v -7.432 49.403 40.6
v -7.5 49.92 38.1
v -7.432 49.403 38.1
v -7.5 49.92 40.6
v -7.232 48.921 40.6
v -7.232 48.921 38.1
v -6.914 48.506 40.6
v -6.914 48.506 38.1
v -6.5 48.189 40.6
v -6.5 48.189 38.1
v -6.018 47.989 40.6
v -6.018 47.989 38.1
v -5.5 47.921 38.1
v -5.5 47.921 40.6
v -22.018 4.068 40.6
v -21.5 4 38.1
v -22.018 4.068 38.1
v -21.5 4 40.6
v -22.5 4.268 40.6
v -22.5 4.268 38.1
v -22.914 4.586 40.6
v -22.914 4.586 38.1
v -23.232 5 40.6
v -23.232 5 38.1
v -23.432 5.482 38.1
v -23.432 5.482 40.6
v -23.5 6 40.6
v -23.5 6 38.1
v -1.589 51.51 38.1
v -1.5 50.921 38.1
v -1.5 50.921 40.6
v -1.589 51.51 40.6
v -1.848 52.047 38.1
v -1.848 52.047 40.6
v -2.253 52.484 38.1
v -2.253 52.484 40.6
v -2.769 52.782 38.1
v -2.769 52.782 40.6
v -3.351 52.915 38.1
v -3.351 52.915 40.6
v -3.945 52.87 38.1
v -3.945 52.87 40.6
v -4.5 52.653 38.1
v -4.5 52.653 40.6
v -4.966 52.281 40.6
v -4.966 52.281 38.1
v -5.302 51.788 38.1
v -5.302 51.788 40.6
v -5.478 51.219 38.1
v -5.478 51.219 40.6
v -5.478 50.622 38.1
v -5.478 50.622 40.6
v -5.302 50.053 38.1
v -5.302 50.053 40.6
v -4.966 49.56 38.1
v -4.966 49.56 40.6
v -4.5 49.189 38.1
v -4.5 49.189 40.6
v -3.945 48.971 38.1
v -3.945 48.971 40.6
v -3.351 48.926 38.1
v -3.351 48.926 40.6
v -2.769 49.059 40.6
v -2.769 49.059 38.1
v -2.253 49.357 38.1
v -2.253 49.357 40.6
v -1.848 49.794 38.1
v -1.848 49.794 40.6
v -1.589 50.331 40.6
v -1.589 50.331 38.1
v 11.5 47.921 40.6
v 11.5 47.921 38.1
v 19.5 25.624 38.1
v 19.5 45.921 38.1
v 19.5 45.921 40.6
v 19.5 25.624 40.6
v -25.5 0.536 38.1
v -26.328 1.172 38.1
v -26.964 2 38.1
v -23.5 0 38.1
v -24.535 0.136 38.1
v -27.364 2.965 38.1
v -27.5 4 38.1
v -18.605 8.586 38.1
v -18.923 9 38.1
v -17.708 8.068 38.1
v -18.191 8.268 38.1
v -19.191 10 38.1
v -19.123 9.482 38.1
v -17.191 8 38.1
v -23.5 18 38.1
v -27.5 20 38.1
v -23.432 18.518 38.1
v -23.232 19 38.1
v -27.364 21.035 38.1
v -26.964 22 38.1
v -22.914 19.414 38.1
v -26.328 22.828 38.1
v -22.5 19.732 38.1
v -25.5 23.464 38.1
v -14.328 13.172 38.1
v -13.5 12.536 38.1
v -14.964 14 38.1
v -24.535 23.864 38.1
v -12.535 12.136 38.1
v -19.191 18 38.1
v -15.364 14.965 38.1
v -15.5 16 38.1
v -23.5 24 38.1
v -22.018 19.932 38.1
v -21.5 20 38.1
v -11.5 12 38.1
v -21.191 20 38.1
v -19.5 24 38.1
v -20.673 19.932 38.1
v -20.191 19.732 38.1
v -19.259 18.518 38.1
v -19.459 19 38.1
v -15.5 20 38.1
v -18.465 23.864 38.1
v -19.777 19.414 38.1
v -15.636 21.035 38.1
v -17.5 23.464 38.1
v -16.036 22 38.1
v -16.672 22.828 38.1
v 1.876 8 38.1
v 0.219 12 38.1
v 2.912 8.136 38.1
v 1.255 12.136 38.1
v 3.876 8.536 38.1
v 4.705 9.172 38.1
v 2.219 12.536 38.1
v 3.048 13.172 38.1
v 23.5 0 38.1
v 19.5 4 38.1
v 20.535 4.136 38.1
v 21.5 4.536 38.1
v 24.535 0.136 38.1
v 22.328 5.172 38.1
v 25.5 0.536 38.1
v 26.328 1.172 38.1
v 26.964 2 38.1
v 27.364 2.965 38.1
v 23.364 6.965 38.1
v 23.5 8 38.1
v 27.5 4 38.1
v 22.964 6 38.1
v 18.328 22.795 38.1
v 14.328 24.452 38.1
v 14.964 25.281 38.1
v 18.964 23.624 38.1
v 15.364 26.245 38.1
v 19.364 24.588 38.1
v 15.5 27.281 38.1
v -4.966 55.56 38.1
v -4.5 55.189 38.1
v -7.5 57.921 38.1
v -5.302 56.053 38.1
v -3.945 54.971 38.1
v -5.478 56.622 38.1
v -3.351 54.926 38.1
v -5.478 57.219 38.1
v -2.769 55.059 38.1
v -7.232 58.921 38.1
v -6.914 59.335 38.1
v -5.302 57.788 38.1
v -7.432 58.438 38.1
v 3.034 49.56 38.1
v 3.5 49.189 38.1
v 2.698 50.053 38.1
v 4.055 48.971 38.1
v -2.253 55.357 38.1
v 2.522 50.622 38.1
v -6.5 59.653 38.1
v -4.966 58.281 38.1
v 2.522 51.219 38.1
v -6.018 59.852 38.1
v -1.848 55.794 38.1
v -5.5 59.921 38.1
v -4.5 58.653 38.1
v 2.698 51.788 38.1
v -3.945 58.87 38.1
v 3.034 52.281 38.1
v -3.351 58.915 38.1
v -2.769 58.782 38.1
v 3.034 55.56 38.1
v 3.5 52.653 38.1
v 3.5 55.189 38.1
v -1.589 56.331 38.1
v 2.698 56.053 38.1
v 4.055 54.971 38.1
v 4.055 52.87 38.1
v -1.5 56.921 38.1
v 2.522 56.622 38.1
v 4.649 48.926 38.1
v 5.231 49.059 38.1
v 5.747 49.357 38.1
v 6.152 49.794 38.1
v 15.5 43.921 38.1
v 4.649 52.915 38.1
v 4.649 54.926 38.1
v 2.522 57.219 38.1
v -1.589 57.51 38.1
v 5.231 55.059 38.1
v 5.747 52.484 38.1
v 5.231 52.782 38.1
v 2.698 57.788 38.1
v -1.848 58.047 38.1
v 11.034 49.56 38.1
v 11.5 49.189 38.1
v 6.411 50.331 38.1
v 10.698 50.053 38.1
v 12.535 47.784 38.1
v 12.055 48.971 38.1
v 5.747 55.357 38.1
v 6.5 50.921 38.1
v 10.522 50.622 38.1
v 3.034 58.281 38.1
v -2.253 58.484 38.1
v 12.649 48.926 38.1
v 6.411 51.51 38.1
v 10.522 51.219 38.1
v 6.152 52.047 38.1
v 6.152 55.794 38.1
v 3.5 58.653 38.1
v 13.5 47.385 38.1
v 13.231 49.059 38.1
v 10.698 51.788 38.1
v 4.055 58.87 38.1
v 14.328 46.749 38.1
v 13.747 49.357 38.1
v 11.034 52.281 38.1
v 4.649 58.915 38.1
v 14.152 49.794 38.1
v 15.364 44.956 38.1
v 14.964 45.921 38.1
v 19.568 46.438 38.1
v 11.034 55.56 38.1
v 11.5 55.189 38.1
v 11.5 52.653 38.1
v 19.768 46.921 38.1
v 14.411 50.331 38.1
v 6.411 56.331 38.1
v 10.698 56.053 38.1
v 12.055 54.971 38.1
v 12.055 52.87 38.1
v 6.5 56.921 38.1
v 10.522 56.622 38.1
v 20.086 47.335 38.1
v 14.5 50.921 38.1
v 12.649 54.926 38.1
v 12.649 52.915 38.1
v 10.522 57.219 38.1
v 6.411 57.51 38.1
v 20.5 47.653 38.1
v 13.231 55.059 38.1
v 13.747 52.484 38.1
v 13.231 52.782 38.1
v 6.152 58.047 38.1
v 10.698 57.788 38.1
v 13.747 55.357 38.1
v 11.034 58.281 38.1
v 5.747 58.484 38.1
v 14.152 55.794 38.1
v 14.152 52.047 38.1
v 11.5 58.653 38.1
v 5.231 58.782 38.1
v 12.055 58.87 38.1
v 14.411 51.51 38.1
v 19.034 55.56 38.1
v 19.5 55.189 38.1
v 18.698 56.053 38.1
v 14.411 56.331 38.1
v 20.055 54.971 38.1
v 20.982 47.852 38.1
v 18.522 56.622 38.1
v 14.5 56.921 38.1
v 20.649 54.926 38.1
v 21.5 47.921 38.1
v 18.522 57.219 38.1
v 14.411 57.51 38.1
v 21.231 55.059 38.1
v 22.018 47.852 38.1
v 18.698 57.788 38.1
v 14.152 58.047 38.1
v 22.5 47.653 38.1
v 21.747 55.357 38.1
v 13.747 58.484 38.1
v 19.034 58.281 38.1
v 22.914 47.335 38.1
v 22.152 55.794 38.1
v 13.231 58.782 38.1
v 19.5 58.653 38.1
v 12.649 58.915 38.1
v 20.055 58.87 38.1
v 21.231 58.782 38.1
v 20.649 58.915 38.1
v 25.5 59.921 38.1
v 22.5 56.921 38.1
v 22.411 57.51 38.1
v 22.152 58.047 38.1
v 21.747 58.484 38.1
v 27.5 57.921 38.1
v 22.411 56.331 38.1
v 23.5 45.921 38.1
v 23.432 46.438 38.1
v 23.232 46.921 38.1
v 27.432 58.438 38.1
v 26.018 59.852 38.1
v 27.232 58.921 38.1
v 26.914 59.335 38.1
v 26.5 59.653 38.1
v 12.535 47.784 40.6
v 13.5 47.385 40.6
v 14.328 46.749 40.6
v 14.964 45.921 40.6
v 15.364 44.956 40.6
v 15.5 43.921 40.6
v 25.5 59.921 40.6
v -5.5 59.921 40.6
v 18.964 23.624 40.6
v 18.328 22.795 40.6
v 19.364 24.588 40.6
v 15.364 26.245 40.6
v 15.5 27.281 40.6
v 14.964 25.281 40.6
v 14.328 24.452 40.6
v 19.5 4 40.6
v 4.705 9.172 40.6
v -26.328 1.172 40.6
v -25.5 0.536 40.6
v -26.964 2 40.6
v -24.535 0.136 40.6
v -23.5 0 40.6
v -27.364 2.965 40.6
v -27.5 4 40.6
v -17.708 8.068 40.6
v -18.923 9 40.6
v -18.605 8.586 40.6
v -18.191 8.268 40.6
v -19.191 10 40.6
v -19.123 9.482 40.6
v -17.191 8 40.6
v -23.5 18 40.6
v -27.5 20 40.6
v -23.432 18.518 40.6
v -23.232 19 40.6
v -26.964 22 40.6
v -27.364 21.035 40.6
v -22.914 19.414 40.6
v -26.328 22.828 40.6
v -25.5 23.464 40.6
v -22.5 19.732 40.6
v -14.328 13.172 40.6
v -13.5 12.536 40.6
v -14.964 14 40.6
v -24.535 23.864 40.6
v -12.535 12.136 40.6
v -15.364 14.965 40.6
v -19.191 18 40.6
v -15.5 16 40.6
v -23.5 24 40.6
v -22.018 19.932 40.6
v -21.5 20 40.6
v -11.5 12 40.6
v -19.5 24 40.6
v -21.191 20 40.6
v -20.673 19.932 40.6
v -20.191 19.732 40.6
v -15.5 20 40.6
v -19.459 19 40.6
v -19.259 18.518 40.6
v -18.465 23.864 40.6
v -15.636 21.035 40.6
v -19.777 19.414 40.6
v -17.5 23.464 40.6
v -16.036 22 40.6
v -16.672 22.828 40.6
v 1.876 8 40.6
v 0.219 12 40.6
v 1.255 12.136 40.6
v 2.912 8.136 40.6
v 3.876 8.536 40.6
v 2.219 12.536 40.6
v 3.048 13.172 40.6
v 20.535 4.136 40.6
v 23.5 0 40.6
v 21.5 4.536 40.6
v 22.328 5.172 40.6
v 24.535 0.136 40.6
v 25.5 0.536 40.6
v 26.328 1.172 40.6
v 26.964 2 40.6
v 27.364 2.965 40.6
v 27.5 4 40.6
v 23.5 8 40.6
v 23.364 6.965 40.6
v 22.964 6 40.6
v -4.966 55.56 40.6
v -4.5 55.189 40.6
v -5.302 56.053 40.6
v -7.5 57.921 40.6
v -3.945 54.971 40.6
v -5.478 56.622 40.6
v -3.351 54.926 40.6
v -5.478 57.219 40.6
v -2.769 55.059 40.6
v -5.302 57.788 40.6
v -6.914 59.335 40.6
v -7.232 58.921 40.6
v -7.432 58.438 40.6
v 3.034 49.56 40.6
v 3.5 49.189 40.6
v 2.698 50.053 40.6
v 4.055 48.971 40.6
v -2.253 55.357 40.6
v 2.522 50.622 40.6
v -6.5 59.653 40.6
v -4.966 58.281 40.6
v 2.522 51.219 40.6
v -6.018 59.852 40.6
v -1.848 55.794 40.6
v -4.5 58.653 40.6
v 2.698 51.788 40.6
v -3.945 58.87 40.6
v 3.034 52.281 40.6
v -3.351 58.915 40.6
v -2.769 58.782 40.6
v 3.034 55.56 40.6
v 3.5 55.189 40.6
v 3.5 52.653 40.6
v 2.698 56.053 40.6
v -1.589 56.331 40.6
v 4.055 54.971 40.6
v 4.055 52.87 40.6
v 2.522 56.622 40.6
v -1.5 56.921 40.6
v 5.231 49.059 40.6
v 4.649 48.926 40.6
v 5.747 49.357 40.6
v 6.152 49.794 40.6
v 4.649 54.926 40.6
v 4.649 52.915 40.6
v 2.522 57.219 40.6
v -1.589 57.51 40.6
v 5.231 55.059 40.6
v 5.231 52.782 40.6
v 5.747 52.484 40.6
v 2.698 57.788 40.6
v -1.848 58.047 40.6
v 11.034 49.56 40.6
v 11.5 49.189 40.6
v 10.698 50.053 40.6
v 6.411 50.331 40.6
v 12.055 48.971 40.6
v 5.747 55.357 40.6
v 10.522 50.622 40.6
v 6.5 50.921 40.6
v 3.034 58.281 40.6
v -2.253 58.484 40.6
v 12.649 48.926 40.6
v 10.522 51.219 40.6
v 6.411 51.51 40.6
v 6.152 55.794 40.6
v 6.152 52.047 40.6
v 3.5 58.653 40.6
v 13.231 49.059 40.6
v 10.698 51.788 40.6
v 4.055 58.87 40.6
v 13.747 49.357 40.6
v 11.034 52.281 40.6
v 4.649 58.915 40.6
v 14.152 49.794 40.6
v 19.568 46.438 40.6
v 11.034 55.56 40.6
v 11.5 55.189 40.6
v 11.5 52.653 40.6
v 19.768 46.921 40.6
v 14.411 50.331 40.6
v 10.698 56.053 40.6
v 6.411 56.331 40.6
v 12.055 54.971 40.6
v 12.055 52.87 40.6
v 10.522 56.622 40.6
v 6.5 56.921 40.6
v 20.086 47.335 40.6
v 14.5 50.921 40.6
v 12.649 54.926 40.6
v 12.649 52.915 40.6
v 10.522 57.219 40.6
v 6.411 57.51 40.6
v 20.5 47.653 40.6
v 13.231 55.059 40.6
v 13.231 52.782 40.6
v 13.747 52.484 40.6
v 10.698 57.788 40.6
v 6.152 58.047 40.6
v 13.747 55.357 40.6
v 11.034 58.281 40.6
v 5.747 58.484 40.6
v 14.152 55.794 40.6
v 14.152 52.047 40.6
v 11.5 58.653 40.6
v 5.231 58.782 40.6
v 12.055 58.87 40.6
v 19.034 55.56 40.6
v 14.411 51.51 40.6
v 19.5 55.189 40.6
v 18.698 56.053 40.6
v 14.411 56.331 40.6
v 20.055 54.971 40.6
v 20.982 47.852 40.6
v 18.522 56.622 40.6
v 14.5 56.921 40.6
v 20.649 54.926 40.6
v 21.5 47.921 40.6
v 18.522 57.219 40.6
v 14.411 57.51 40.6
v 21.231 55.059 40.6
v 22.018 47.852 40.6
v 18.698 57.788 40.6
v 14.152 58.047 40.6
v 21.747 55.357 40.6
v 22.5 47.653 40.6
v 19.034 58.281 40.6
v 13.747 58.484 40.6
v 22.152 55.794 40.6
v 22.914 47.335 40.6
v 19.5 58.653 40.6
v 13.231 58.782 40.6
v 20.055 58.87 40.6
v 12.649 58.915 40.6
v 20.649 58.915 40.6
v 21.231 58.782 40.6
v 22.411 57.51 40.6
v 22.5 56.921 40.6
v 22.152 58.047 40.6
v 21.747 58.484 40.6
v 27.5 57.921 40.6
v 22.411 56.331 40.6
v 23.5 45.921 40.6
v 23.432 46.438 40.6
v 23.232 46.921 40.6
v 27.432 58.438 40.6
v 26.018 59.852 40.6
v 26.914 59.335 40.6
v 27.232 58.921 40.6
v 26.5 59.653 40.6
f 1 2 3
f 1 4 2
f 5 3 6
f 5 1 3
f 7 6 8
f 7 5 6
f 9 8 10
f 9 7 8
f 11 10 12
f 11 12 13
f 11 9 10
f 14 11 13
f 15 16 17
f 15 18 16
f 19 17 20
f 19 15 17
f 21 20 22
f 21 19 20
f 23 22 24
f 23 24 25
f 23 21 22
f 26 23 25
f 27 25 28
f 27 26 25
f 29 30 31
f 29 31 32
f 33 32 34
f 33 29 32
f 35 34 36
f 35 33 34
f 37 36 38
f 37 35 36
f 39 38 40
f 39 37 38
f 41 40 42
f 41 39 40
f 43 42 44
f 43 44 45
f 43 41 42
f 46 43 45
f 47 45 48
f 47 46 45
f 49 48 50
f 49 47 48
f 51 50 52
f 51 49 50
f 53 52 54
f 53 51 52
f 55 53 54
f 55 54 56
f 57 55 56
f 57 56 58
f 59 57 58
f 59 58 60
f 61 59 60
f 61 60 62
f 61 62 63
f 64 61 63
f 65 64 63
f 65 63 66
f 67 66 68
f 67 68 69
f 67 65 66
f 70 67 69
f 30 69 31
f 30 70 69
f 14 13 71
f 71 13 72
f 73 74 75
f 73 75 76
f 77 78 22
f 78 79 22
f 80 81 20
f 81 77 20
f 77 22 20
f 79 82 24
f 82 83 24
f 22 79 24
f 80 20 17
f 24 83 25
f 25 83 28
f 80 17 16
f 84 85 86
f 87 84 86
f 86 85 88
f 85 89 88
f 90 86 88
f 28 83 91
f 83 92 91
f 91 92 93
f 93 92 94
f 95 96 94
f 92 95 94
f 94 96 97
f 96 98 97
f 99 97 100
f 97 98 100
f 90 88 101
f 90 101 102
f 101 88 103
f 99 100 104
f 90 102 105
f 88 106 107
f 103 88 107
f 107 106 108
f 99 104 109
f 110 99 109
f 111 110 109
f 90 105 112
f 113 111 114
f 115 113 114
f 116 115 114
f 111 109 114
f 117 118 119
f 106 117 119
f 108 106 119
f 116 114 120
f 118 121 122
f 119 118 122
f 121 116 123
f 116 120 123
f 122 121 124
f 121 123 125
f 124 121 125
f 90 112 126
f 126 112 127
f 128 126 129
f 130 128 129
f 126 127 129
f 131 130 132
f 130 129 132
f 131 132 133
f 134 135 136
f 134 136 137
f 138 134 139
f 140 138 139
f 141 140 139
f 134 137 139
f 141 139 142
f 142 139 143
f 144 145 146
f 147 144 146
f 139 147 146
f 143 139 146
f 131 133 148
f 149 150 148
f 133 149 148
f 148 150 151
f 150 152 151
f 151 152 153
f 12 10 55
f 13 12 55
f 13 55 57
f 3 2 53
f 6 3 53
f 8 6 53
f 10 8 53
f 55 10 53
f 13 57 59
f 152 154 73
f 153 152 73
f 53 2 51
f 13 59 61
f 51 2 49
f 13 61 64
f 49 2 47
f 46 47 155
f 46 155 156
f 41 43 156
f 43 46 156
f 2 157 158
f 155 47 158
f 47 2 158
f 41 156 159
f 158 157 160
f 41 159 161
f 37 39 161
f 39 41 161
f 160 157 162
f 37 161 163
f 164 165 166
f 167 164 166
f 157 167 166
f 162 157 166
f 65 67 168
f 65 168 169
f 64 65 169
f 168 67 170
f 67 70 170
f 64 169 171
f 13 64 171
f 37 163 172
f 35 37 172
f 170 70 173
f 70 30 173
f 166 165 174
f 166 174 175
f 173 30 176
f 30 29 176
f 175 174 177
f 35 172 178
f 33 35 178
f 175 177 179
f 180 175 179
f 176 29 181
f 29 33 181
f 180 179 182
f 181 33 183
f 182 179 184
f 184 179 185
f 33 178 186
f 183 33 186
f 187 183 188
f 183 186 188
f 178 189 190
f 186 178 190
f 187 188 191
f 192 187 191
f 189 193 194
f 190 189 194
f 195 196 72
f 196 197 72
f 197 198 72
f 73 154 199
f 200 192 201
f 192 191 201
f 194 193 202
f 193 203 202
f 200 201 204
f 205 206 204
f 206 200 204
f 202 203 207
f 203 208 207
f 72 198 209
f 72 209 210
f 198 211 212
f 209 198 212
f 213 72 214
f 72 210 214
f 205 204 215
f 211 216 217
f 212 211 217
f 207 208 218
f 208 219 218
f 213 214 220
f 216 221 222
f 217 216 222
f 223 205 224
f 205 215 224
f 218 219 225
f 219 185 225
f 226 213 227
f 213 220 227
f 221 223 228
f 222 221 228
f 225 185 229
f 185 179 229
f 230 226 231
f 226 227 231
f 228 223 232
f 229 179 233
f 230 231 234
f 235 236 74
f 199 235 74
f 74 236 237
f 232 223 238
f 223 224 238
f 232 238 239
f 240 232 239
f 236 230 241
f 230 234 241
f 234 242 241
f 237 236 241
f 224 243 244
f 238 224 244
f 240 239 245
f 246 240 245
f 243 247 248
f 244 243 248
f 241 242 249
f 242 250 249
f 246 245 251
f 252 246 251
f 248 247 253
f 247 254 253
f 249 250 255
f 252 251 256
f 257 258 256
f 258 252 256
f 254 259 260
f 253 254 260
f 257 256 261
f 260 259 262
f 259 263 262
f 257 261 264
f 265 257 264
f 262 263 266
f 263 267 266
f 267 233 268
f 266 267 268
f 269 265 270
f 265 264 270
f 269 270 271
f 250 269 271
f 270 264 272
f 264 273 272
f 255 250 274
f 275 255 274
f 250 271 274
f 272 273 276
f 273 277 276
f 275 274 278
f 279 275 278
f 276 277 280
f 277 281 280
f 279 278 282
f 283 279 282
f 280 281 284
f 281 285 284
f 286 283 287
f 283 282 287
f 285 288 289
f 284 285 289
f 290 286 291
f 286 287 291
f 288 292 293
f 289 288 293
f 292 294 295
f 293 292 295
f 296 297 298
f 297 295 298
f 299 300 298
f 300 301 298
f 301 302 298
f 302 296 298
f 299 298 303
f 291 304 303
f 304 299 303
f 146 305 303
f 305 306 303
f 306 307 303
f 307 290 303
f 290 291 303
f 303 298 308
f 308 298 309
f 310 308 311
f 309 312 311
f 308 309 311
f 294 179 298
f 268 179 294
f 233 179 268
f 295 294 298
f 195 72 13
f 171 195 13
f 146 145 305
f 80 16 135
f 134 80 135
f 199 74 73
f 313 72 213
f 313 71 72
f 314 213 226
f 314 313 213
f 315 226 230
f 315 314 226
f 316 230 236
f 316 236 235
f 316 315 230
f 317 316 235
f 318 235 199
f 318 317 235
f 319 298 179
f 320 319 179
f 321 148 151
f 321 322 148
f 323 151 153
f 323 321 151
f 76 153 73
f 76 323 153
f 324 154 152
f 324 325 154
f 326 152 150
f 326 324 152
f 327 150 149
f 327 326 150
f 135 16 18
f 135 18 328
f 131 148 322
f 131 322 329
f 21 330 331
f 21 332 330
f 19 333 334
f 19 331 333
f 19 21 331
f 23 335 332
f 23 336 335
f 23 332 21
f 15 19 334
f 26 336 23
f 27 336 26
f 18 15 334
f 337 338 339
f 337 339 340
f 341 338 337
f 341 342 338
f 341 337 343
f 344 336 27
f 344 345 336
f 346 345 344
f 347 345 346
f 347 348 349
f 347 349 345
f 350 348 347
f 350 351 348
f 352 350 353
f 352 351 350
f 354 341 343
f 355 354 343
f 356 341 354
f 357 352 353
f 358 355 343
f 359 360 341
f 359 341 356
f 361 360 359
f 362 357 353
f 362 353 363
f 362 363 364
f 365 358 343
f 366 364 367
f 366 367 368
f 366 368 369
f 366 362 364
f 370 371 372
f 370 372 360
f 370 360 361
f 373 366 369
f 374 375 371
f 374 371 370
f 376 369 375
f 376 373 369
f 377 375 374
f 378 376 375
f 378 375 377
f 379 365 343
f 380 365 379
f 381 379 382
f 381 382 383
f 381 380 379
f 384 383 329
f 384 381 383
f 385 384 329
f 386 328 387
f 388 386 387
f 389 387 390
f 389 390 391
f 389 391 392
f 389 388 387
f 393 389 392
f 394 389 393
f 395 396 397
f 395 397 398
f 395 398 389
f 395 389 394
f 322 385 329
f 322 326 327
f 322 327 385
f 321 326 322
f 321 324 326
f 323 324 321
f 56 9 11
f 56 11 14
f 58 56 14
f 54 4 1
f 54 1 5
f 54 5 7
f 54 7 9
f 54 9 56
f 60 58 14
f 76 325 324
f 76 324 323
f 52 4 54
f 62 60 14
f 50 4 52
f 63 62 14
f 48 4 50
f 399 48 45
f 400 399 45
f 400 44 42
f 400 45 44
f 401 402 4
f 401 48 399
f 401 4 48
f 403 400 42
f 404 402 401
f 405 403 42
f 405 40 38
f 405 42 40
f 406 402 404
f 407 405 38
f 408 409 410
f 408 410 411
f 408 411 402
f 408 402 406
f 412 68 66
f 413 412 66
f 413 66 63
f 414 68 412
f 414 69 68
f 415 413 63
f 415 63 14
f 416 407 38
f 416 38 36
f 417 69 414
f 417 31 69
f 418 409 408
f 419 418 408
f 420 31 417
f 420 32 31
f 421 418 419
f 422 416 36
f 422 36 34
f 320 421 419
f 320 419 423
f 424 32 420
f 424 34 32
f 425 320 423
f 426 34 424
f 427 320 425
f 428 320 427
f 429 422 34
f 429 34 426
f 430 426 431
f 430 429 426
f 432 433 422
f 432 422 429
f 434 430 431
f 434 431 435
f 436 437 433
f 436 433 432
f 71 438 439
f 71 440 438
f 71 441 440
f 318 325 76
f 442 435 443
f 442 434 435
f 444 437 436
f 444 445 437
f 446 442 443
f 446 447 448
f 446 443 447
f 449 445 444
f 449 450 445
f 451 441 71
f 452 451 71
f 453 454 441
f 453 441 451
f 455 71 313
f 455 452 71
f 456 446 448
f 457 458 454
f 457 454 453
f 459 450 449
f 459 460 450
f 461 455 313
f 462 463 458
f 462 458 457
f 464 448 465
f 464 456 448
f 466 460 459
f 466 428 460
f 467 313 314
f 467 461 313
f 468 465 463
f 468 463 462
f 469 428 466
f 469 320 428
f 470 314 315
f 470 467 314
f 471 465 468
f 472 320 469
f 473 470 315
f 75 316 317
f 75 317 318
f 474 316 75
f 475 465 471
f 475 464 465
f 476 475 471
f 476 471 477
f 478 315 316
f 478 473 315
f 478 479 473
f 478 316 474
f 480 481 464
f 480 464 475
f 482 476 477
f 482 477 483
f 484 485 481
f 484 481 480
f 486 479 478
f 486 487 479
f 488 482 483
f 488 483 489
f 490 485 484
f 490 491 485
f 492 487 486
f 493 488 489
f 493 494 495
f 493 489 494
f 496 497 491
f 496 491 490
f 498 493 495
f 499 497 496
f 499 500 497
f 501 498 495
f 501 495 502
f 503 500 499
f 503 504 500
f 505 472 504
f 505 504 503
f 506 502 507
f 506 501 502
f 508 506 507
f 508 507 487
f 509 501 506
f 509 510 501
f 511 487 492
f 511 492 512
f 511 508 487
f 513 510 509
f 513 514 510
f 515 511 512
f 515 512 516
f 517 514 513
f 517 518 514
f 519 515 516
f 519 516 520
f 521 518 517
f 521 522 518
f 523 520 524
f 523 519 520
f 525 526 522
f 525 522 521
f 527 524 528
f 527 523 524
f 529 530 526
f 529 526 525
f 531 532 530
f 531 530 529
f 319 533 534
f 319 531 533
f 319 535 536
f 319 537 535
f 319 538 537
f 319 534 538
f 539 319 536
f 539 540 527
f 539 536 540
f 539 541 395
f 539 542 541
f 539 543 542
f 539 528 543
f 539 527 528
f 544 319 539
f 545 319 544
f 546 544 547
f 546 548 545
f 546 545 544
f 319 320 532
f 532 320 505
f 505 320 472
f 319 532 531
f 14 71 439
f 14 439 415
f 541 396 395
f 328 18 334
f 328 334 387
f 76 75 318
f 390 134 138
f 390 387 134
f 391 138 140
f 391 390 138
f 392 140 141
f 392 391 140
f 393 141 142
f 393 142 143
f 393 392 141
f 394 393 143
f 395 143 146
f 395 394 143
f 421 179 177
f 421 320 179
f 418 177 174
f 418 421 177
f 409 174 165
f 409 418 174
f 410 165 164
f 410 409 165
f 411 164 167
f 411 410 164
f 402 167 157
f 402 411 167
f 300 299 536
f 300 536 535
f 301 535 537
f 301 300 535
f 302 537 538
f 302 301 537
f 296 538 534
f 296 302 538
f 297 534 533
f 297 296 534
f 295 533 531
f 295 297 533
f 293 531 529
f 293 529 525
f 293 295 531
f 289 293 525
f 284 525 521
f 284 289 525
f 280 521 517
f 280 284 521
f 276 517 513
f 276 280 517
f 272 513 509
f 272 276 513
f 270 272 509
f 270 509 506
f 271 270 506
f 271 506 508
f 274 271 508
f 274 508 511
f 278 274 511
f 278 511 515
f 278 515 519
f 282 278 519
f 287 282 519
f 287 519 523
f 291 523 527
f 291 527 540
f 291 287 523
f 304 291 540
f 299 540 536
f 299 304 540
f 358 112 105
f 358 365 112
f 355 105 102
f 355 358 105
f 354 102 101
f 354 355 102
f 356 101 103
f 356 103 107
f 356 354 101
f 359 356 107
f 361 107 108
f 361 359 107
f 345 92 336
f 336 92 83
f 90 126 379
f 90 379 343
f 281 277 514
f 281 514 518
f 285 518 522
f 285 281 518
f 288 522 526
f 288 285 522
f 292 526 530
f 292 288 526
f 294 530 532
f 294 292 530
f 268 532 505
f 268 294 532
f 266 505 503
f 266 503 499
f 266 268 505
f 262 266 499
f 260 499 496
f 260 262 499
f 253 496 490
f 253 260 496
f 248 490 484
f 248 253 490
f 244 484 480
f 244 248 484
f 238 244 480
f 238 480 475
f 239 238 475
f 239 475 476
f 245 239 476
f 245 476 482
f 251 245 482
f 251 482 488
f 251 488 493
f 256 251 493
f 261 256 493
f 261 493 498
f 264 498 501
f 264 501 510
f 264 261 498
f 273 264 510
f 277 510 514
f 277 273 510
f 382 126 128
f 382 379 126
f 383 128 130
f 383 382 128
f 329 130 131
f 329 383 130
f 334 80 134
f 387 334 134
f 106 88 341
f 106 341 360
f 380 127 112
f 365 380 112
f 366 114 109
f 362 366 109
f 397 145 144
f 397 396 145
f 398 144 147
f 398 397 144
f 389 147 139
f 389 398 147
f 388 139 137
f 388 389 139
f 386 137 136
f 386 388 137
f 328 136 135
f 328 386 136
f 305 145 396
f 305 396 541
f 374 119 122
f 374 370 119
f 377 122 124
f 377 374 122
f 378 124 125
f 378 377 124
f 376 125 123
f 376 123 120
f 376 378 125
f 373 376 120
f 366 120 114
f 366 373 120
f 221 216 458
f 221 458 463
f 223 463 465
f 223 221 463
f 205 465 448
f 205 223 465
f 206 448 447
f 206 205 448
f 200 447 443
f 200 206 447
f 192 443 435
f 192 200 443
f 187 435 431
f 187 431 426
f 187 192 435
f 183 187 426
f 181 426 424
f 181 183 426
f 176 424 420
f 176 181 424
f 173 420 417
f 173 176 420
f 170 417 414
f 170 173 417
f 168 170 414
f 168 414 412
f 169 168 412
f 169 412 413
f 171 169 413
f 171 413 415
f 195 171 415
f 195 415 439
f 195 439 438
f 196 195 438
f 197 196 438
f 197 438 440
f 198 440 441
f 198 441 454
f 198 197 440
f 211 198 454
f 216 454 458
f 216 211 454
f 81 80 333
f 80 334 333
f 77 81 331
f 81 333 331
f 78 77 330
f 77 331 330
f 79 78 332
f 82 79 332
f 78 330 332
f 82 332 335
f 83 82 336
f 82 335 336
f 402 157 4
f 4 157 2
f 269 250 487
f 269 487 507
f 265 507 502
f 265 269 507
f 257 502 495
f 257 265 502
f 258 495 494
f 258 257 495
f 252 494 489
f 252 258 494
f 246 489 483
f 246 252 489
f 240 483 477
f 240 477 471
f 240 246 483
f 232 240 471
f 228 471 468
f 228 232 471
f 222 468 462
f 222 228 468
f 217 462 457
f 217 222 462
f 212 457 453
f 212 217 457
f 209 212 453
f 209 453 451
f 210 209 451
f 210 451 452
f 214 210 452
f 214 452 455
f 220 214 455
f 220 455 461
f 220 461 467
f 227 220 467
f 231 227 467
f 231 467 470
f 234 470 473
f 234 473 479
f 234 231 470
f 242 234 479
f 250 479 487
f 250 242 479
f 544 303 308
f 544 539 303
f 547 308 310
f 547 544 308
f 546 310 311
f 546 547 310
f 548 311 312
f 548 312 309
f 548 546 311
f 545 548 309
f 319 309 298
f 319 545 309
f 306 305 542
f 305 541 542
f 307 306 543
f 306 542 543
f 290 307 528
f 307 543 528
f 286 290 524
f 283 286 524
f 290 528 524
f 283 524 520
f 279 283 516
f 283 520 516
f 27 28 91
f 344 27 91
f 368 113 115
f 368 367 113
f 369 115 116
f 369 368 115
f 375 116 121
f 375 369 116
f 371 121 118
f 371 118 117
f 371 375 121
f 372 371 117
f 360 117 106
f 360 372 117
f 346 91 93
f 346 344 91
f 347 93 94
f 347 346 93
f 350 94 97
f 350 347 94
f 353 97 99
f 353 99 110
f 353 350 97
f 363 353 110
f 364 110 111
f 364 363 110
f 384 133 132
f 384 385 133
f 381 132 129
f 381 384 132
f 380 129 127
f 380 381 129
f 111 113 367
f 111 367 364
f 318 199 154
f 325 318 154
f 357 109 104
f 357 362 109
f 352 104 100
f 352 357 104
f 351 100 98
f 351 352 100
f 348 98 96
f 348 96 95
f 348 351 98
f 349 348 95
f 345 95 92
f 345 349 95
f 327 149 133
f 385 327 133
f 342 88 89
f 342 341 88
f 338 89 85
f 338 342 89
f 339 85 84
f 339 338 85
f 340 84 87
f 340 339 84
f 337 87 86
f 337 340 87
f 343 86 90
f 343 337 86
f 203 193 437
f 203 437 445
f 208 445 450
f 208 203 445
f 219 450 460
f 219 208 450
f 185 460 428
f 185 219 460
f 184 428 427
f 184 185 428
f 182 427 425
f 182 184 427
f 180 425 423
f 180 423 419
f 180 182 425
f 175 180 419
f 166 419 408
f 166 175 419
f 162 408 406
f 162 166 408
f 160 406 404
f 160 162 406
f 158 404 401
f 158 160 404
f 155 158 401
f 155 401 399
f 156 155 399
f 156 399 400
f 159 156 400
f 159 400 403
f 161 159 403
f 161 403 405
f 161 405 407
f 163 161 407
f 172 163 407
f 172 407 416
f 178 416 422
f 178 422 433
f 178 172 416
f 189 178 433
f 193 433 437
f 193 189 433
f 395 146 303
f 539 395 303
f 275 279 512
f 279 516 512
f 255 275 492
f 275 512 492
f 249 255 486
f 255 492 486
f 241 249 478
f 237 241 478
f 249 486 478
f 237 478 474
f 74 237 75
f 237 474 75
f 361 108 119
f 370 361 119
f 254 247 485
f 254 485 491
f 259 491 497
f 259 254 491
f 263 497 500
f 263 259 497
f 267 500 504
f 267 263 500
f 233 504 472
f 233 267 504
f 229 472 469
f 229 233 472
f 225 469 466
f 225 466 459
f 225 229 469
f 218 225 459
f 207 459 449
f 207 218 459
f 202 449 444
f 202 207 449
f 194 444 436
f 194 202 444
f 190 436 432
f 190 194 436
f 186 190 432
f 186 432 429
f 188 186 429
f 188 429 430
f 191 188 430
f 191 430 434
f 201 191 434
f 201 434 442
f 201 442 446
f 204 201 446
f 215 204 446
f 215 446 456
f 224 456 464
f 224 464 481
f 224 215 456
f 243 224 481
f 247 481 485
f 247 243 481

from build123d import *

# Parameters (mm, degrees)
SKETCH2_R           = 2
BOSS_EXTRUDE1_DEPTH = 2.5
FILLET1_R           = 4
FILLET2_R           = 2


with BuildPart() as part:
    # Sketch2 → Boss-Extrude1 (new body)
    with BuildSketch(Plane.XY.offset(38.1)):
        Polygon((-27.5, 0), (27.5, 0), (27.5, 59.920564885), (-7.5, 59.920564885), (-7.5, 47.920564885), (15.5, 47.920564885), (15.5, 25.623759218), (1.876240782, 12), (-15.5, 12), (-15.5, 24), (-27.5, 24), (-27.5, 12), align=None)
        with Locations((-3.5, 56.920564885)):
            Circle(SKETCH2_R, mode=Mode.SUBTRACT)
        with Locations((-3.5, 50.920564885)):
            Circle(SKETCH2_R, mode=Mode.SUBTRACT)
        with Locations((4.5, 50.920564885)):
            Circle(SKETCH2_R, mode=Mode.SUBTRACT)
        with Locations((12.5, 50.920564885)):
            Circle(SKETCH2_R, mode=Mode.SUBTRACT)
        with Locations((4.5, 56.920564885)):
            Circle(SKETCH2_R, mode=Mode.SUBTRACT)
        with Locations((12.5, 56.920564885)):
            Circle(SKETCH2_R, mode=Mode.SUBTRACT)
        with Locations((20.5, 56.920564885)):
            Circle(SKETCH2_R, mode=Mode.SUBTRACT)
        Polygon((23.5, 4), (23.5, 47.920564885), (19.5, 47.920564885), (19.5, 23.966904969), (3.533095031, 8), (-19.190748402, 8), (-19.190748402, 20), (-23.5, 20), (-23.5, 8), (-23.5, 4), align=None, mode=Mode.SUBTRACT)
    extrude(amount=BOSS_EXTRUDE1_DEPTH)

    # Fillet1
    fillet1_edges = [part.edges().sort_by_distance(p)[0] for p in [
        (15.5, 25.623759218, 39.35),
        (15.5, 47.920564885, 39.35),
        (27.5, 0, 39.35),
        (-27.5, 0, 39.35),
        (-27.5, 24, 39.35),
        (-15.5, 24, 39.35),
        (-15.5, 12, 39.35),
        (1.876240782, 12, 39.35),
        (23.5, 4, 39.35),
        (19.5, 23.966904969, 39.35),
        (3.533095031, 8, 39.35),
    ]]
    fillet(fillet1_edges, radius=FILLET1_R)

    # Fillet2
    fillet2_edges = [part.edges().sort_by_distance(p)[0] for p in [
        (-7.5, 47.920564885, 39.35),
        (-7.5, 59.920564885, 39.35),
        (27.5, 59.920564885, 39.35),
        (-23.5, 4, 39.35),
        (23.5, 47.920564885, 39.35),
        (19.5, 47.920564885, 39.35),
        (-19.190748402, 8, 39.35),
        (-19.190748402, 20, 39.35),
        (-23.5, 20, 39.35),
    ]]
    fillet(fillet2_edges, radius=FILLET2_R - 0.0001)  # a hair under: the kernel refuses the full size


solid = part.part
